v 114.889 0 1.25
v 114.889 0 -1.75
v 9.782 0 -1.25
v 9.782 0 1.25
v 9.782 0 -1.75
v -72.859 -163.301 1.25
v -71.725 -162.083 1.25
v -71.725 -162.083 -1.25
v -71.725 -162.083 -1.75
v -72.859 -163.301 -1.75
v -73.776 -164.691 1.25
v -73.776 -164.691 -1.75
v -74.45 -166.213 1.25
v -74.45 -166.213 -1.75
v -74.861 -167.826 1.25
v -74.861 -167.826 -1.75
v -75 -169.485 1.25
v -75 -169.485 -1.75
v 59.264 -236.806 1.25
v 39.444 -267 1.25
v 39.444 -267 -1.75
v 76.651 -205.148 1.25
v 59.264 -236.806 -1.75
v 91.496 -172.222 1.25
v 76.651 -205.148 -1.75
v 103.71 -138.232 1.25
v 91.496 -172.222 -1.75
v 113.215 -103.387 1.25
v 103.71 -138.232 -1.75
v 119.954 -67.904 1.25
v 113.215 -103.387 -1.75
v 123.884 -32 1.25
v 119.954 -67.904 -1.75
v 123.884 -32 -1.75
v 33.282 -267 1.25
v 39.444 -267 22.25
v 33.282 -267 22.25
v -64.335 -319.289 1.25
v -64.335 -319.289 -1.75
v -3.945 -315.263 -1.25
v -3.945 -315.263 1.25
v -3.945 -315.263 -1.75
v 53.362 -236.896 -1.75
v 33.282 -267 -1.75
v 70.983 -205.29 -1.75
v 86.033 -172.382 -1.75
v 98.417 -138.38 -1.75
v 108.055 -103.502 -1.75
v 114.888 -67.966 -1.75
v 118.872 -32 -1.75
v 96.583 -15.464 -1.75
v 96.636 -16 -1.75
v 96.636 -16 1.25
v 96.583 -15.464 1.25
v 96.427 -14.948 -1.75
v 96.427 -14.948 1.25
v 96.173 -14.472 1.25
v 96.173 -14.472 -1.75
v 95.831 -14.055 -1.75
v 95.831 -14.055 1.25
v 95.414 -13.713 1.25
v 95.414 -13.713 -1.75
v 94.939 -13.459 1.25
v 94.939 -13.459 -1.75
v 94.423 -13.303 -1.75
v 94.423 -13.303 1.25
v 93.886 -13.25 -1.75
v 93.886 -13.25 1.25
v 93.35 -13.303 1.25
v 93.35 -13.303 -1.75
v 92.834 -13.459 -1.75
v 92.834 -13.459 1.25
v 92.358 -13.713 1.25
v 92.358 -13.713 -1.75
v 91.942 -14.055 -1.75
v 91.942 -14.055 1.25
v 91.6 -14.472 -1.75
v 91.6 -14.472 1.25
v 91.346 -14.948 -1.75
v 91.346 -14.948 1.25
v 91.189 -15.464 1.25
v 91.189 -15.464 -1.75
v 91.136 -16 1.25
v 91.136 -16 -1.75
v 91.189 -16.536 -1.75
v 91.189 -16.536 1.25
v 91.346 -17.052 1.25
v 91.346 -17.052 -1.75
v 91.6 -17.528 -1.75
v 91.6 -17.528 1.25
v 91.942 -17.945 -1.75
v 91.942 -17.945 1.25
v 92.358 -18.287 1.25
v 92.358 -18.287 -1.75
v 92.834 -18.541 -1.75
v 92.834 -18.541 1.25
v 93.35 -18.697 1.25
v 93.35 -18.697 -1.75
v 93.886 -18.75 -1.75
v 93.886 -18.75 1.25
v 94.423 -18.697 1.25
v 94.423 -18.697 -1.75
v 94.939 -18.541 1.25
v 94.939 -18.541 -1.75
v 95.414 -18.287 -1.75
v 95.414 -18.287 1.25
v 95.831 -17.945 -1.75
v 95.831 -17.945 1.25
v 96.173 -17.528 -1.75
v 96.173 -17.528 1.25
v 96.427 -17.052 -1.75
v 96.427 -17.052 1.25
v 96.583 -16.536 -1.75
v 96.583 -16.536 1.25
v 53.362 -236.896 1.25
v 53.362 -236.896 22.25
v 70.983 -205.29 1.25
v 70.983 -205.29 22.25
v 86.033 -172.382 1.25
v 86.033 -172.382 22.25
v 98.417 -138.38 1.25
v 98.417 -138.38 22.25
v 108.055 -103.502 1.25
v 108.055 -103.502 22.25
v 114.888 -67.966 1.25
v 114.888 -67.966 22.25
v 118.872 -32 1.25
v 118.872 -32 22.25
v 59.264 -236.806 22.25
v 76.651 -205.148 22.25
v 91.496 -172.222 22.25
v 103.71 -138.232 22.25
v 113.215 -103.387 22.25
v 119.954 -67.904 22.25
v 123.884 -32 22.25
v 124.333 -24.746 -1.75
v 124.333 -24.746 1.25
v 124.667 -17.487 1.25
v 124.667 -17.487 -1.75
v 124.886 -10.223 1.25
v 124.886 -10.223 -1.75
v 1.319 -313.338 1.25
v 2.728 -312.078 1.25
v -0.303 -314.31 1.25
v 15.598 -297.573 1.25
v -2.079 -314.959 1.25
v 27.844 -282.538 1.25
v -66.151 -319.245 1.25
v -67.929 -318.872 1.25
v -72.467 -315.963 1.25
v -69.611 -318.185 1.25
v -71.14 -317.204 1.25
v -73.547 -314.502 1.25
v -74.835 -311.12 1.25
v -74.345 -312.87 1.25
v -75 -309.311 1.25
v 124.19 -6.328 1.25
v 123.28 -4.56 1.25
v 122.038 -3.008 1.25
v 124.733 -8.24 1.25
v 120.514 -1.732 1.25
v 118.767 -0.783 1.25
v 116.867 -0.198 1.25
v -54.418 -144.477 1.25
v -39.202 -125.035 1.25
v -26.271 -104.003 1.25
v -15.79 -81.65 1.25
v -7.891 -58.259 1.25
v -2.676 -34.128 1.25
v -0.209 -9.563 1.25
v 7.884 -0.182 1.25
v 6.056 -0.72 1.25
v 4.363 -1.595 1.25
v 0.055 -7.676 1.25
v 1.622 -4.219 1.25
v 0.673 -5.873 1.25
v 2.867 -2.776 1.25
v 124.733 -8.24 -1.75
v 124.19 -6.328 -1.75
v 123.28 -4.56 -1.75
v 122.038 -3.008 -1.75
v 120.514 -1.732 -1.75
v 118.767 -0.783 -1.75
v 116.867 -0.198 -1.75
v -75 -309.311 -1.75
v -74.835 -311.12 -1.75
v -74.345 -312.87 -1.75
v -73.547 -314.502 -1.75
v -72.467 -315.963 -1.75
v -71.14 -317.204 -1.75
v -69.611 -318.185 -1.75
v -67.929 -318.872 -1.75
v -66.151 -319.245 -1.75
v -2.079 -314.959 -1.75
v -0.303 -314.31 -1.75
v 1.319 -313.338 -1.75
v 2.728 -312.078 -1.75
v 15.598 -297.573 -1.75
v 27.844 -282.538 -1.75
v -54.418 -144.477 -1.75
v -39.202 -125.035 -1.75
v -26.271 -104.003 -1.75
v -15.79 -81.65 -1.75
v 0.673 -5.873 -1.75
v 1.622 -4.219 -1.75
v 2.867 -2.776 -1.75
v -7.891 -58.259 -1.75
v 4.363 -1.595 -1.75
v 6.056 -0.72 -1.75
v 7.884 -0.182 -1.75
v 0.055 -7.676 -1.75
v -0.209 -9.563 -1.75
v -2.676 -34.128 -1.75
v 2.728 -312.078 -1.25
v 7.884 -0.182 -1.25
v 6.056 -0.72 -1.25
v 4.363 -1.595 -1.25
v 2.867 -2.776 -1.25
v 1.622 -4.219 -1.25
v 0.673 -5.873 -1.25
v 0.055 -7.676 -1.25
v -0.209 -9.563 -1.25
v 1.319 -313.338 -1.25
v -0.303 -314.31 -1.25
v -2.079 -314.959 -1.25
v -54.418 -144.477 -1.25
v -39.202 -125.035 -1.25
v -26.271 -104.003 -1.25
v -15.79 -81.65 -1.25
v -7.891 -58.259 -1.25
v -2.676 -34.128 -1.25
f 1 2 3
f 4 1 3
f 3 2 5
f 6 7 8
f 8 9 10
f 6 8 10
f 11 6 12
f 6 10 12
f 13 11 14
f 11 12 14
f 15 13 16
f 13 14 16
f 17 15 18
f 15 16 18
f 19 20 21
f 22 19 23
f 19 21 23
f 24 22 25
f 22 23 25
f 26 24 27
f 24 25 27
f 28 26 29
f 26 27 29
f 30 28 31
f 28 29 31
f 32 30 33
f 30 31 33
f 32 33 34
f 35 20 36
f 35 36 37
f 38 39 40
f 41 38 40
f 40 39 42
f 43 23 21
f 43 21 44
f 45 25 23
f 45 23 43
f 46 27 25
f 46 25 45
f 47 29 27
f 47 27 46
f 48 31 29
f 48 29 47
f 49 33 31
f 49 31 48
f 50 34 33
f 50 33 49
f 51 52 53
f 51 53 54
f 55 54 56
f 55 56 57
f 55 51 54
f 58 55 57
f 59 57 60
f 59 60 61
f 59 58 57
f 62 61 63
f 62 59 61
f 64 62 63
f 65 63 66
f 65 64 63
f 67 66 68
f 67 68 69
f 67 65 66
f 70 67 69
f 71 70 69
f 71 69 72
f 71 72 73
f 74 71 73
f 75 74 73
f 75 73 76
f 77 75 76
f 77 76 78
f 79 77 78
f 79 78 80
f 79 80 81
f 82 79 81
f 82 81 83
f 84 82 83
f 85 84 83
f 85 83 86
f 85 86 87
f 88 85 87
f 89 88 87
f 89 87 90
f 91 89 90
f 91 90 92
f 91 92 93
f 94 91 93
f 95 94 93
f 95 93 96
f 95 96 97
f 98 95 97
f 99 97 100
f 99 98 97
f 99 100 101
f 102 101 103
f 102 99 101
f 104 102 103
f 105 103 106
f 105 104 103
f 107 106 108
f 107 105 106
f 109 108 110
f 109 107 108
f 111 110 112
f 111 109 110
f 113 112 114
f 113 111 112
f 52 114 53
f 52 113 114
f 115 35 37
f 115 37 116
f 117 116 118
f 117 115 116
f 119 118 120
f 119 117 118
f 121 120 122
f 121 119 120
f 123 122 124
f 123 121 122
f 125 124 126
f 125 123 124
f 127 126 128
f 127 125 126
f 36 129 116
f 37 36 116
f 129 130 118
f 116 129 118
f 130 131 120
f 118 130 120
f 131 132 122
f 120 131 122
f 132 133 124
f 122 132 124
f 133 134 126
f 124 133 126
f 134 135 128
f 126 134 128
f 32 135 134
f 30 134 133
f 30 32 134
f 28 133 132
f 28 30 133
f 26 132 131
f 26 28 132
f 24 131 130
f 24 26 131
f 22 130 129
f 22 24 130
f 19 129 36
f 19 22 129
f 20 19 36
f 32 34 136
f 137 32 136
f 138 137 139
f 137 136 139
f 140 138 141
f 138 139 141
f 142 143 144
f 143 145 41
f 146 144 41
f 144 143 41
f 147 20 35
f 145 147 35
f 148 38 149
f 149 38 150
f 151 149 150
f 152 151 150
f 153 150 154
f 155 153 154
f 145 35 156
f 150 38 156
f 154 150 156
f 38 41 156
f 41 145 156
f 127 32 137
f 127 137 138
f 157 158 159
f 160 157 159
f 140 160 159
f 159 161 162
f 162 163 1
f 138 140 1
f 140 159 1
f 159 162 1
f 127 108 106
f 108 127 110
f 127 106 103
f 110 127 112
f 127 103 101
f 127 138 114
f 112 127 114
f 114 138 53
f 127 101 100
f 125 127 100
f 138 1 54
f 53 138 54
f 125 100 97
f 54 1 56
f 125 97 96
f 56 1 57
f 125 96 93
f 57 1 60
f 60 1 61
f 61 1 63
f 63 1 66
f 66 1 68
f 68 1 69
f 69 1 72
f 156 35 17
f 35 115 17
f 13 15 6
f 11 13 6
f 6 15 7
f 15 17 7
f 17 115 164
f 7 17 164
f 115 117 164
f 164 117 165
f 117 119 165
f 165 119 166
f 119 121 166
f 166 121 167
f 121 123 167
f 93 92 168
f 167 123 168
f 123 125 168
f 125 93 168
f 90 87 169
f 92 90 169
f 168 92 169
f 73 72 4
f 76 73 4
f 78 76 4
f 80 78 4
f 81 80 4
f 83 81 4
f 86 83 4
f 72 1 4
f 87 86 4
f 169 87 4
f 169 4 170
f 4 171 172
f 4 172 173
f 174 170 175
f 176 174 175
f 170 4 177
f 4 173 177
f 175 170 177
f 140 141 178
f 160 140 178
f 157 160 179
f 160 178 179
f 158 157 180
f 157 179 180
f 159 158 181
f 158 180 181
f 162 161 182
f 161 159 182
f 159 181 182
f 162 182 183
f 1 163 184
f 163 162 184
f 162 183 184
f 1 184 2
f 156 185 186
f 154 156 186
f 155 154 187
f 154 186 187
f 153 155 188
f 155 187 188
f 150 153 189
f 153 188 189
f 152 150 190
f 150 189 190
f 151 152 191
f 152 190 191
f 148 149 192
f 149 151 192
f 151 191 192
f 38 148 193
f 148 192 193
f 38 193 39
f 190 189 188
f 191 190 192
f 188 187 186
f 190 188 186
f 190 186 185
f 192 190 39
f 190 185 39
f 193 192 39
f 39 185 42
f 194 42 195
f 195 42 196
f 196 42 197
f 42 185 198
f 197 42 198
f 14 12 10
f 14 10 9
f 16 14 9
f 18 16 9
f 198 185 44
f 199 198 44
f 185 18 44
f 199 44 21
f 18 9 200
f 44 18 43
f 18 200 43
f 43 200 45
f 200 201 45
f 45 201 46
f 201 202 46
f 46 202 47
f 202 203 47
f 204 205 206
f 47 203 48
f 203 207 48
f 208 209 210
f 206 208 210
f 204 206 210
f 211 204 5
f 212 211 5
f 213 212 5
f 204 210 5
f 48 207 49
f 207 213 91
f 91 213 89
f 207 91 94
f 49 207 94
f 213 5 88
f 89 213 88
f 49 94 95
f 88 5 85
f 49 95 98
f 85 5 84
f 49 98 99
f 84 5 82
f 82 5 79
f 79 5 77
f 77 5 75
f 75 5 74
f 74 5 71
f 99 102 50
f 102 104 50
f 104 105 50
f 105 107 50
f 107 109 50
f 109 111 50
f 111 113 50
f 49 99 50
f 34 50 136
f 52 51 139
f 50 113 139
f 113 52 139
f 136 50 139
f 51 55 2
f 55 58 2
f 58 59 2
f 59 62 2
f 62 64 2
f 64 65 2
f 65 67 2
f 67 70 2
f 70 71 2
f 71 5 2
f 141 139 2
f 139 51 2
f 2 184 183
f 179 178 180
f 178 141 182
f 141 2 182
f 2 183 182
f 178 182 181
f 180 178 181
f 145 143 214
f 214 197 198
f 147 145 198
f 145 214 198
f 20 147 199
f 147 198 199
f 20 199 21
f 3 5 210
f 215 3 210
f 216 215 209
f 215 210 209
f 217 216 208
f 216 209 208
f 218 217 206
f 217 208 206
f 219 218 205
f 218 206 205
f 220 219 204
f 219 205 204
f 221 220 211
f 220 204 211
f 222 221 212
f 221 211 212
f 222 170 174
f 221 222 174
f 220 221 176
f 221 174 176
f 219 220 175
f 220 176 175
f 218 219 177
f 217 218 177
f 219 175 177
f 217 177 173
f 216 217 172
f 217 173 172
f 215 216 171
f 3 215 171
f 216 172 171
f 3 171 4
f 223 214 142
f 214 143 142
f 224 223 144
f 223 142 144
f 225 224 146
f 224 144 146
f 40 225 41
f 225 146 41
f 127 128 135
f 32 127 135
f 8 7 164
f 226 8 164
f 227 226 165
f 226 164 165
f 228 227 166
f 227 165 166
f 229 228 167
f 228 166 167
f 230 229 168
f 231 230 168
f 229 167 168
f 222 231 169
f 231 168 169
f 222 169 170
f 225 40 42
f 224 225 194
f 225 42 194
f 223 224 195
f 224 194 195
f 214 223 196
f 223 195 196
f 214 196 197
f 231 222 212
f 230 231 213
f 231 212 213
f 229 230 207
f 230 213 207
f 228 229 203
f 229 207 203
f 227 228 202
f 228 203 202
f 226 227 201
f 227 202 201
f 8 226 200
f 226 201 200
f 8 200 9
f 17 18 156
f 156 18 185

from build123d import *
from build123d.topology import SkipClean

# Parameters (mm, degrees)
RESSALTO_EXTRUS_O1_DEPTH    = 1.25
ESBO_O2_R                   = 2.75
CORTE_EXTRUS_O1_DEPTH       = 343.874678981
CONVERTER_S_LIDO1_START     = -1.75
CONVERTER_S_LIDO1_OUTLINE_R = 2.75
CONVERTER_S_LIDO1_DEPTH     = 0.5
RESSALTO_EXTRUS_O2_DEPTH    = 24


# Read off the part's stored shape, not the designer's step: Converter-Sólido1
with BuildPart() as part:
    # Esboço1 → Ressalto-extrusão1 (new, symmetric)
    with BuildSketch(Plane.XY):
        with BuildLine():
            Line((9.781555201, 0), (114.888726767, 0))
            ThreePointArc((114.888726767, 0), (122.038034046, -3.008047095), (124.886250727, -10.222518914))
            ThreePointArc((124.886250727, -10.222518914), (91.45004484, -172.337167523), (2.728289048, -312.078318252))
            ThreePointArc((2.728289048, -312.078318252), (-0.303175893, -314.310106116), (-3.944968584, -315.262997906))
            Line((-3.944968584, -315.262997906), (-64.334809895, -319.288987326))
            ThreePointArc((-64.334809895, -319.288987326), (-71.831840855, -316.613597697), (-75, -309.311135748))
            Line((-75, -309.311135748), (-75, -169.484512567))
            ThreePointArc((-75, -169.484512567), (-74.144640734, -165.437841608), (-71.72489083, -162.083442149))
            ThreePointArc((-71.72489083, -162.083442149), (-20.715574655, -92.974656039), (-0.208905725, -9.563318777))
            ThreePointArc((-0.208905725, -9.563318777), (2.866600834, -2.776191717), (9.781555201, 0))
        make_face()
    extrude(amount=RESSALTO_EXTRUS_O1_DEPTH, both=True)

    # Esboço2 → Corte-extrusão1 (cut, through all)
    with BuildSketch(Plane.XY.offset(1.25)):
        with Locations((93.886250727, -16)):
            Circle(ESBO_O2_R)
    extrude(amount=-CORTE_EXTRUS_O1_DEPTH, mode=Mode.SUBTRACT)

    # Converter-Sólido1 outline → Converter-Sólido1 (add)
    with BuildSketch(Plane.XY.offset(CONVERTER_S_LIDO1_START)):
        with BuildLine():
            ThreePointArc((2.728289048, -312.078318252), (91.45004484, -172.337167523), (124.886250727, -10.222518914))
            ThreePointArc((124.886250727, -10.222518914), (122.038034046, -3.008047095), (114.888726767, 0))
            Line((114.888726767, 0), (9.781555201, 0))
            ThreePointArc((9.781555201, 0), (2.866600835, -2.776191716), (-0.208905725, -9.563318777))
            ThreePointArc((-0.208905725, -9.563318777), (-20.715574655, -92.974656038), (-71.72489083, -162.083442149))
            ThreePointArc((-71.72489083, -162.083442149), (-74.144640734, -165.437841608), (-75, -169.484512567))
            Line((-75, -169.484512567), (-75, -309.311135748))
            ThreePointArc((-75, -309.311135748), (-71.831840855, -316.613597697), (-64.334809895, -319.288987326))
            Line((-64.334809895, -319.288987326), (-3.944968584, -315.262997906))
            ThreePointArc((-3.944968584, -315.262997906), (-0.303175894, -314.310106116), (2.728289048, -312.078318252))
        make_face()
        with Locations((93.886250727, -16)):
            Circle(CONVERTER_S_LIDO1_OUTLINE_R, mode=Mode.SUBTRACT)
    extrude(amount=CONVERTER_S_LIDO1_DEPTH)

    # Esboço8 → Ressalto-extrusão2 (add)
    with SkipClean():  # the faces are left unmerged after this step: merging them gives an invalid solid
        with BuildSketch(Plane(origin=(0, 0, -1.75), x_dir=(-1, 0, 0), z_dir=(0, 0, -1))):
            with BuildLine():
                Line((-118.871838966, -32), (-123.884147664, -32))
                ThreePointArc((-123.884147664, -32), (-97.937341323, -155.347298973), (-39.44403165, -267))
                Line((-39.44403165, -267), (-33.282417311, -267))
                ThreePointArc((-33.282417311, -267), (-92.563373986, -155.504460627), (-118.871838966, -32))
            make_face()
        extrude(amount=-RESSALTO_EXTRUS_O2_DEPTH)


solid = part.part
